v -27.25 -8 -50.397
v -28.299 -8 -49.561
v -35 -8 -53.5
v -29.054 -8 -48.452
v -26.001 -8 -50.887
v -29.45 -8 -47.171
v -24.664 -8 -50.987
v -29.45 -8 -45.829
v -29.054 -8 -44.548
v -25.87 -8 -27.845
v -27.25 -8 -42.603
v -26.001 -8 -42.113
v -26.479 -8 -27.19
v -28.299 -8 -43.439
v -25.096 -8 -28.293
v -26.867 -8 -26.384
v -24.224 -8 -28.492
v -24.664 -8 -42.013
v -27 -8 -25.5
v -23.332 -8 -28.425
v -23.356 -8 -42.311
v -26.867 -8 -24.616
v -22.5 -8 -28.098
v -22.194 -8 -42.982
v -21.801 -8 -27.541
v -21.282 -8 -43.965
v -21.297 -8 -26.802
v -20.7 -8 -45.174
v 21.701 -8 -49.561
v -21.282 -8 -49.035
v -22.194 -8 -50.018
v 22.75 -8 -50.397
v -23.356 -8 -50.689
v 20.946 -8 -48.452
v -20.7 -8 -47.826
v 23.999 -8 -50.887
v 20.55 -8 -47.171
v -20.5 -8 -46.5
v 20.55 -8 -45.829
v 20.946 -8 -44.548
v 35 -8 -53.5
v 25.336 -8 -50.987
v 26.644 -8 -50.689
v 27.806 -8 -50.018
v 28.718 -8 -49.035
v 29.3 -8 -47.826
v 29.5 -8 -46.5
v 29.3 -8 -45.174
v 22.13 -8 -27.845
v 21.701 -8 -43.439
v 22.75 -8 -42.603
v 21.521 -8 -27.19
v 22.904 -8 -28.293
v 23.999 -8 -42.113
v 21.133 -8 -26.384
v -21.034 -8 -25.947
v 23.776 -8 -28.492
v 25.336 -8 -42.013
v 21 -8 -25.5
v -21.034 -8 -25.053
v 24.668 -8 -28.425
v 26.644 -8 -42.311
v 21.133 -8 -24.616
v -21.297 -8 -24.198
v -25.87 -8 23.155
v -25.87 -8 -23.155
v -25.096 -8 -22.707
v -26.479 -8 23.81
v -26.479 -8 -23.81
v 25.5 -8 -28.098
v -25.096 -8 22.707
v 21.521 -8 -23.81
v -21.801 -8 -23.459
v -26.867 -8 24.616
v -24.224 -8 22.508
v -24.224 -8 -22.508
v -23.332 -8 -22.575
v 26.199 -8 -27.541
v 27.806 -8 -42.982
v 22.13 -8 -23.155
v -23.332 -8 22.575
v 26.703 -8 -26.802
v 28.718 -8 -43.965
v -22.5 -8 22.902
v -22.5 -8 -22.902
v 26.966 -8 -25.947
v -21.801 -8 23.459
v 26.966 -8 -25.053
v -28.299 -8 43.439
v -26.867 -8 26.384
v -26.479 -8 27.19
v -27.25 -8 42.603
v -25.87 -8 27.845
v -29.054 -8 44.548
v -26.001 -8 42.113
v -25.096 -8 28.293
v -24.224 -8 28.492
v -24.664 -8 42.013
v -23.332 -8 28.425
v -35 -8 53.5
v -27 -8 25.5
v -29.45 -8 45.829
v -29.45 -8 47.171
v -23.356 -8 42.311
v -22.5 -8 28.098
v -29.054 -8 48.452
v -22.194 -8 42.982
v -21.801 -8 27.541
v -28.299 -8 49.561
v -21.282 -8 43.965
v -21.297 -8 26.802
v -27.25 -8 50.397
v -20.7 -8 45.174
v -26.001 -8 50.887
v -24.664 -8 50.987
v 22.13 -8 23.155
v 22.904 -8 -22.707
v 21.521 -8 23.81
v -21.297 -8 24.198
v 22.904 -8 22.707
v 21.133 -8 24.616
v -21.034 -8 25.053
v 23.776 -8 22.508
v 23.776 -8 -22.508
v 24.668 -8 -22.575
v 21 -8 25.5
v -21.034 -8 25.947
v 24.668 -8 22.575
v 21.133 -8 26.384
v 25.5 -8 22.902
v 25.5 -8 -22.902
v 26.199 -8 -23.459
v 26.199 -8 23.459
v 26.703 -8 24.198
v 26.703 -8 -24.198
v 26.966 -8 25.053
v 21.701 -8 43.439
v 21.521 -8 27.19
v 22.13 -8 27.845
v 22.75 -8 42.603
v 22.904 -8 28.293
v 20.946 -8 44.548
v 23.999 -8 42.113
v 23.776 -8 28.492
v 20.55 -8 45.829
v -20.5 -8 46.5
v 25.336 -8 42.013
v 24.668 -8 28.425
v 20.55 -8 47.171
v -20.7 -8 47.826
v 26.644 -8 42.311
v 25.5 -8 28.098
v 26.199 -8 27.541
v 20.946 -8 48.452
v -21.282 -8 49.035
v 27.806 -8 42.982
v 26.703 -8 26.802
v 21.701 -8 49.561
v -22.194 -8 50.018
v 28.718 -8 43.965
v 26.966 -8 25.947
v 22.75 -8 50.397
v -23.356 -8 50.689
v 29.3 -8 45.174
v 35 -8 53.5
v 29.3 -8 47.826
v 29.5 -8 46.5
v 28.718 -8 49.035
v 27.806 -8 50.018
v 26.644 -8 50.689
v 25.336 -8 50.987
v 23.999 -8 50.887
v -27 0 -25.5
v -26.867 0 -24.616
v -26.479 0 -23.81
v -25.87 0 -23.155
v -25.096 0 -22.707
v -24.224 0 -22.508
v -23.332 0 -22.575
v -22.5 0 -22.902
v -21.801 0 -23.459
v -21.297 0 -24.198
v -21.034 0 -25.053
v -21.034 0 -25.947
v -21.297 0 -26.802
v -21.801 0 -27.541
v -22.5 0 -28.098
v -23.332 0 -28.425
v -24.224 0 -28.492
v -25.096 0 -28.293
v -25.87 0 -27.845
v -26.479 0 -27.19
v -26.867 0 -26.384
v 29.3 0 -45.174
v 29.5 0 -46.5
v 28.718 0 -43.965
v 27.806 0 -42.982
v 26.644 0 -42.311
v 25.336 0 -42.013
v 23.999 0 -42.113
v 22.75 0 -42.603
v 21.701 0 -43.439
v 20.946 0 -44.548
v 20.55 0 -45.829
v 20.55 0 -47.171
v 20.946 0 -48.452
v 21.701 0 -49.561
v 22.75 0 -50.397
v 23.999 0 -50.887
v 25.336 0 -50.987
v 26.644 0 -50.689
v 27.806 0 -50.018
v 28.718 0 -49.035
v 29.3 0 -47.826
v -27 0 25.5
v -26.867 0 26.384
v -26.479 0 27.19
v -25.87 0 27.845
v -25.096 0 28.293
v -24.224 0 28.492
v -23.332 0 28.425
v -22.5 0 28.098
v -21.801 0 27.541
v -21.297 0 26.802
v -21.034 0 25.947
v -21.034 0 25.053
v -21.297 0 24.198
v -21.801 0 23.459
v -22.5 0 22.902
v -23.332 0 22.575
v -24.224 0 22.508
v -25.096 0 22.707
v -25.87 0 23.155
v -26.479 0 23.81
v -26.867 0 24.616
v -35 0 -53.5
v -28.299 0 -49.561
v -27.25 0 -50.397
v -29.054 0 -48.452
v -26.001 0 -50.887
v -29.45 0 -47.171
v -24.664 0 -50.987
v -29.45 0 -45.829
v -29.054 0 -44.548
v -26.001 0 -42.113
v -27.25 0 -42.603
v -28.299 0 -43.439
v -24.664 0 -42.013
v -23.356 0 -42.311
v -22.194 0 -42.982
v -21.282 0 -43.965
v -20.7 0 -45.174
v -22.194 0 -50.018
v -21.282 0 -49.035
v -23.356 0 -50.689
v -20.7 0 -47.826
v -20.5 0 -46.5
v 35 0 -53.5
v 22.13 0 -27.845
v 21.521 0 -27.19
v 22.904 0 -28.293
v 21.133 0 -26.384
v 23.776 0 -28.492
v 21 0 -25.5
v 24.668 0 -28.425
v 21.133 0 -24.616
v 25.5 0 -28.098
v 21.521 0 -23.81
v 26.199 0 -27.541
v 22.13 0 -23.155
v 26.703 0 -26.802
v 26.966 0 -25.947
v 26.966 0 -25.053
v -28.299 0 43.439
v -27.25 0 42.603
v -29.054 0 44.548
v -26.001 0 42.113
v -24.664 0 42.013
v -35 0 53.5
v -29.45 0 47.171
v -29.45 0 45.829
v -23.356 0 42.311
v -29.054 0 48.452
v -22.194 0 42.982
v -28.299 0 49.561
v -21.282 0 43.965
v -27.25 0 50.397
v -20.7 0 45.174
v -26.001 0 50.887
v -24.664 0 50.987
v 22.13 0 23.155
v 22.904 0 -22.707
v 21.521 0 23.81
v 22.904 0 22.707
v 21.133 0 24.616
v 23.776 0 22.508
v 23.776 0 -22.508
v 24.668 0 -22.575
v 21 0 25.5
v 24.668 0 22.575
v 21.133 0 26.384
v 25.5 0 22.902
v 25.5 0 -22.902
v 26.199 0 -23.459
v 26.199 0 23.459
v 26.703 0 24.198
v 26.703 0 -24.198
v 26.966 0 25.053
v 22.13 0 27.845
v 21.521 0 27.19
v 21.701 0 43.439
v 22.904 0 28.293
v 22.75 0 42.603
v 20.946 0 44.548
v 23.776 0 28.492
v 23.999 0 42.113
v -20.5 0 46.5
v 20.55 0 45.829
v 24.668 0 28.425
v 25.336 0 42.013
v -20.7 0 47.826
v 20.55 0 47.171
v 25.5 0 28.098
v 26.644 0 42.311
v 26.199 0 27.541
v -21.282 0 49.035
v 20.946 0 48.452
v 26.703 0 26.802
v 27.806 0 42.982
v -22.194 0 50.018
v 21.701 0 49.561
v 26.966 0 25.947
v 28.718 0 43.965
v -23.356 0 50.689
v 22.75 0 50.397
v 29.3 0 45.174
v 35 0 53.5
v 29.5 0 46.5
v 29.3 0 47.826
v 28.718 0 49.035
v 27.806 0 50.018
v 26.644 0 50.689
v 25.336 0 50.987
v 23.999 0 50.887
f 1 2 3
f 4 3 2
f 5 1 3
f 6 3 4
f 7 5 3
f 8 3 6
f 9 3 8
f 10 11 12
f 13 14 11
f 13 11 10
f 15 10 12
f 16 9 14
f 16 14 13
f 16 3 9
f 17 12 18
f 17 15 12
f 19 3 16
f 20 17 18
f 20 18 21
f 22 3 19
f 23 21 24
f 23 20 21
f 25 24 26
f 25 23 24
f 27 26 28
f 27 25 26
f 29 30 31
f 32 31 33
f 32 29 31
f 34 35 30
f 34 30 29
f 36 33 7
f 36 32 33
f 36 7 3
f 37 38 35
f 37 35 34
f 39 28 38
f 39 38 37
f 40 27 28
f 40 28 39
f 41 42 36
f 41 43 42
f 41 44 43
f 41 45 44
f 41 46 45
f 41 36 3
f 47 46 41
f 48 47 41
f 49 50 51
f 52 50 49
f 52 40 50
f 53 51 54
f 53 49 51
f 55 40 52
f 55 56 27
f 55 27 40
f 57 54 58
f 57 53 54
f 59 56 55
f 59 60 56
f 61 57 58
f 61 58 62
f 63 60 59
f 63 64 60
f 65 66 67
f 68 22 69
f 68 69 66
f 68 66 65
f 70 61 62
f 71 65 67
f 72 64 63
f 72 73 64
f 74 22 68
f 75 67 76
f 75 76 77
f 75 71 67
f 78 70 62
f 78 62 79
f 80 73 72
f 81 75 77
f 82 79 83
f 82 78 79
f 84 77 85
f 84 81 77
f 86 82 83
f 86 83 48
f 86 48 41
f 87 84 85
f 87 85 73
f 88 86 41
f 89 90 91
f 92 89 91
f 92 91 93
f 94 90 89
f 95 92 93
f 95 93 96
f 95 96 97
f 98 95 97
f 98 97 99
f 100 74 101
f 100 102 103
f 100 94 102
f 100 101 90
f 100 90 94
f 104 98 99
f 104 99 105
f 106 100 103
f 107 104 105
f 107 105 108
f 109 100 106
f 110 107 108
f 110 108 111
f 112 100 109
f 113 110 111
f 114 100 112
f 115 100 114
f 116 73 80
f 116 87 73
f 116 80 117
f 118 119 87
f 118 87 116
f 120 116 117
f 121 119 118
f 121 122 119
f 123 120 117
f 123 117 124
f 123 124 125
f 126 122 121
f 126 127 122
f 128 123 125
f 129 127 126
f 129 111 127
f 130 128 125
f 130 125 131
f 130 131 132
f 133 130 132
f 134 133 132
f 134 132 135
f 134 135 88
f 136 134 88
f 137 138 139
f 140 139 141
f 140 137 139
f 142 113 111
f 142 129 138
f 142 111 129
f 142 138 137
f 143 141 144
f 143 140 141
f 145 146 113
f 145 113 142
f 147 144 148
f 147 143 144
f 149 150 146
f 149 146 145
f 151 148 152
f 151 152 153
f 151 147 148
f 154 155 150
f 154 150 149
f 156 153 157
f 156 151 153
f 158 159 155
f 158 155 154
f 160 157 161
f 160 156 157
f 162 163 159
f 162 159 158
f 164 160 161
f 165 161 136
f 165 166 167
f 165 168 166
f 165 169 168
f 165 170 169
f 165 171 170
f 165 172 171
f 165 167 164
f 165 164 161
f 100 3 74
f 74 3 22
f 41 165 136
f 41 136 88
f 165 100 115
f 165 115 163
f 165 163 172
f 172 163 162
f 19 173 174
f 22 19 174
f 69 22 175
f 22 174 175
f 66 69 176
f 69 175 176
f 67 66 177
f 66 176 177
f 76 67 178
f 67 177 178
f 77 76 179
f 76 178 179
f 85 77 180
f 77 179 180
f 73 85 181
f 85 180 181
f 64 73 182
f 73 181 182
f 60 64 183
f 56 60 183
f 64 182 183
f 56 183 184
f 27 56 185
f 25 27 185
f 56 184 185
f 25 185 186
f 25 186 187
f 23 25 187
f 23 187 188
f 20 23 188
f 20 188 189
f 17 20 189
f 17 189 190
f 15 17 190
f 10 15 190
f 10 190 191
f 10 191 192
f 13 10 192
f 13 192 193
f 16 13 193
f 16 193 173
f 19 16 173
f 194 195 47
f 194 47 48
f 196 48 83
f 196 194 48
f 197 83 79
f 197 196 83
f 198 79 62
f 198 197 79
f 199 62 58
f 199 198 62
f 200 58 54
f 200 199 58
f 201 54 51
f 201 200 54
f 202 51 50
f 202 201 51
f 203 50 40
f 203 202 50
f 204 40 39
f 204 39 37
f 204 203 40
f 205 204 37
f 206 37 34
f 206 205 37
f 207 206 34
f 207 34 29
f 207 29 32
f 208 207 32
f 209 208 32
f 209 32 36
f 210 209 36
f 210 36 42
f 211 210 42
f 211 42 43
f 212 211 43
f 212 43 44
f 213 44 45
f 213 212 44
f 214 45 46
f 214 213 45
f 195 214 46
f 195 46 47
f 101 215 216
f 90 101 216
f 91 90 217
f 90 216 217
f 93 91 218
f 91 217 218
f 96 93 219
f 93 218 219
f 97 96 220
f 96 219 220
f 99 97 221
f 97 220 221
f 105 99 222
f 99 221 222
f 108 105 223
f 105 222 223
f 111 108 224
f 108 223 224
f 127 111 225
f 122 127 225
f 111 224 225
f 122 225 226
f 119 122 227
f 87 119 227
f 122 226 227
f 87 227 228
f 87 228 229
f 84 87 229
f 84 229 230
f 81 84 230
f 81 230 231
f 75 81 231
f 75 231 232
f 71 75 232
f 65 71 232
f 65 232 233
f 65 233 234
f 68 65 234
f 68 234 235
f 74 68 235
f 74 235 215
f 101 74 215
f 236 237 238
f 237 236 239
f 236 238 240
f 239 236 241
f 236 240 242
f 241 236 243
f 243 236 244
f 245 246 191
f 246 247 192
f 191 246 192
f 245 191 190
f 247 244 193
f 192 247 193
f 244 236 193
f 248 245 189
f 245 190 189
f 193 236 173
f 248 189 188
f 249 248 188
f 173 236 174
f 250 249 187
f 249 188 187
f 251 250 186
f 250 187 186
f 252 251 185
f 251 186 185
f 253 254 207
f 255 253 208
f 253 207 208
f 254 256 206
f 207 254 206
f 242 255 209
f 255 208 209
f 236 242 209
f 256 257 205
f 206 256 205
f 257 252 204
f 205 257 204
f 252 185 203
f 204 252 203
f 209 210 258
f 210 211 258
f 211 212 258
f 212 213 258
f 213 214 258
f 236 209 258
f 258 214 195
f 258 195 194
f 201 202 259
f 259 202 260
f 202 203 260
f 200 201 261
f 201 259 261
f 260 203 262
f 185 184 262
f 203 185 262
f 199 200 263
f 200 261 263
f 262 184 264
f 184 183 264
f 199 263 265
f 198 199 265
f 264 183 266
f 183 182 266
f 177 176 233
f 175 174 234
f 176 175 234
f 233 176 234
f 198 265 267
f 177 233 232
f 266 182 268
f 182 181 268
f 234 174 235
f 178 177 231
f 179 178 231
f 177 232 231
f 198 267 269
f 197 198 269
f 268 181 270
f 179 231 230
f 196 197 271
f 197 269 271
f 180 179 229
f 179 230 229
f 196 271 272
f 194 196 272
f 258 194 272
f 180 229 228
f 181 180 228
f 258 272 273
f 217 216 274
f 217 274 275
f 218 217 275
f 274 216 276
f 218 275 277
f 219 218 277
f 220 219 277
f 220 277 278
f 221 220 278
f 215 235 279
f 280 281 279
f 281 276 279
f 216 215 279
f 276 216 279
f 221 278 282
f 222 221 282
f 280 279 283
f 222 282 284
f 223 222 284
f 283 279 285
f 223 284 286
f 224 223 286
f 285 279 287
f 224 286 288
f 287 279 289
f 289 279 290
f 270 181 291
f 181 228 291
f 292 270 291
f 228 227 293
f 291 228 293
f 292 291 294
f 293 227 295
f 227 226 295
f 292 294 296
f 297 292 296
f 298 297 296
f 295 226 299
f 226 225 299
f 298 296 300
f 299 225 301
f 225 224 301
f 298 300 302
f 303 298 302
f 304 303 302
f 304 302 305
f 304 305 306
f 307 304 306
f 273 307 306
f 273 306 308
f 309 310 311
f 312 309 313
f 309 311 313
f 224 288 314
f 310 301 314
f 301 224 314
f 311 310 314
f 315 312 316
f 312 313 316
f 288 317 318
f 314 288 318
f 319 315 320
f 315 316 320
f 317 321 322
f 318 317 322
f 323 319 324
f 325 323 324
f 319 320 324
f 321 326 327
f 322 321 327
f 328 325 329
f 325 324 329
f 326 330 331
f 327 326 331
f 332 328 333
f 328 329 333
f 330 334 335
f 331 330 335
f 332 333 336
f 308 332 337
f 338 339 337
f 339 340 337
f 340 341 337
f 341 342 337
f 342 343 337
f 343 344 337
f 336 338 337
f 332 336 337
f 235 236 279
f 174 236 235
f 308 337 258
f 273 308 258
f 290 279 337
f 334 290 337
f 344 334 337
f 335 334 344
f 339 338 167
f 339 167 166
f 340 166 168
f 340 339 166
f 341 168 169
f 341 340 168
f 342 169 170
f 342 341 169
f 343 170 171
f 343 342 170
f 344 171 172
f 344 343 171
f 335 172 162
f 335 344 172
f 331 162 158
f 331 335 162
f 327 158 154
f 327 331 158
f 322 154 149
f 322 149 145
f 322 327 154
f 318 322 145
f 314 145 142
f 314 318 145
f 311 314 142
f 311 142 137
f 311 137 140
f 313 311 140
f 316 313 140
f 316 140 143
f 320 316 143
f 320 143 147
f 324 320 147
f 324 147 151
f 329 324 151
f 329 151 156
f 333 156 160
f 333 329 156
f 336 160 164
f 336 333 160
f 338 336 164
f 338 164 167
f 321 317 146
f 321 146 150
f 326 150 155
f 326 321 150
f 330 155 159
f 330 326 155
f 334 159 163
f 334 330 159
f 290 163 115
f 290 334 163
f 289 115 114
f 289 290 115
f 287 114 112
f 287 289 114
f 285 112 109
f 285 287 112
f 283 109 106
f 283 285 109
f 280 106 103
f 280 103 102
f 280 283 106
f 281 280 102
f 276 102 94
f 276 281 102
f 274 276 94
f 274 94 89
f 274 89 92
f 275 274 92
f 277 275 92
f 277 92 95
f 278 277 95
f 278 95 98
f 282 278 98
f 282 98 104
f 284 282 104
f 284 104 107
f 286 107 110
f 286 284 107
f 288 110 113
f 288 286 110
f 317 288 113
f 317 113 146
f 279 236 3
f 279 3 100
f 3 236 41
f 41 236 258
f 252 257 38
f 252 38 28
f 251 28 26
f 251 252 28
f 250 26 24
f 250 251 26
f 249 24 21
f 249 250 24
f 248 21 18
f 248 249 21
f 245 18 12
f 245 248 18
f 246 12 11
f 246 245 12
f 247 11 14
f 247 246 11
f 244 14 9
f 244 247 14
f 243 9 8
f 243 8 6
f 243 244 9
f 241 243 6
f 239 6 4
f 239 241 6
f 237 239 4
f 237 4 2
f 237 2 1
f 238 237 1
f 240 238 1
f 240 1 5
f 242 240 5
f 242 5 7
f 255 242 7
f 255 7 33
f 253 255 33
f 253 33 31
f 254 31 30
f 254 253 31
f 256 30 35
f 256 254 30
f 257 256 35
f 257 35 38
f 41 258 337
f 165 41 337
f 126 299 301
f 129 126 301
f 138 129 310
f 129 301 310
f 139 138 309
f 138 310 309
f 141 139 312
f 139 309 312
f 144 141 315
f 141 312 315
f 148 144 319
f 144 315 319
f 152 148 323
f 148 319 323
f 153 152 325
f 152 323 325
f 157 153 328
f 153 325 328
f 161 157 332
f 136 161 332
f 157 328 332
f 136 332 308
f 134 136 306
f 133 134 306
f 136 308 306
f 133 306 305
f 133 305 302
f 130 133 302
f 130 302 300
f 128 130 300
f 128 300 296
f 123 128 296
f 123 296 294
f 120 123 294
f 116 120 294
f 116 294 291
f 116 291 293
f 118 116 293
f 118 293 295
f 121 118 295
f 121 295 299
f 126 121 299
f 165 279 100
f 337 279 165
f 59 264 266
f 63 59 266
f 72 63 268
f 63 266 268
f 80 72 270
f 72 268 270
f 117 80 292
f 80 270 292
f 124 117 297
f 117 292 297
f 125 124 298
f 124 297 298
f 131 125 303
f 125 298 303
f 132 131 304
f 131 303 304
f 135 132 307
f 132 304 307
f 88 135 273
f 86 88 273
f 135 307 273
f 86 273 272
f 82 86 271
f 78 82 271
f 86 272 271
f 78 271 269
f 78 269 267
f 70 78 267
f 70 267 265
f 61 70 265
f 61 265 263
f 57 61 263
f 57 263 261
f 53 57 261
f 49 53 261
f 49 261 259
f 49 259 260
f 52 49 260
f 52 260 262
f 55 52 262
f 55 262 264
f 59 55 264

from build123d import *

# Parameters (mm, degrees)
F0_W     = 70
F0_H     = 107
F0_R     = 4.5
F1_DEPTH = 8
F3_D     = 6
F3_DEPTH = 21


with BuildPart() as f1:
    # F0 (on Front) → F1 (new body)
    with BuildSketch(Plane.XZ):
        Rectangle(F0_W, F0_H)
        with Locations((-25, -46.5)):
            Circle(F0_R, mode=Mode.SUBTRACT)
        with Locations((25, -46.5)):
            Circle(F0_R, mode=Mode.SUBTRACT)
        with Locations((-25, 46.5)):
            Circle(F0_R, mode=Mode.SUBTRACT)
        with Locations((25, 46.5)):
            Circle(F0_R, mode=Mode.SUBTRACT)
    extrude(amount=F1_DEPTH)

    # F3
    with Locations(Plane.XZ.offset(8)):
        with Locations((-24, 25.5), (24, 25.5), (-24, -25.5), (24, -25.5)):
            Hole(F3_D / 2, depth=F3_DEPTH)


solid = f1.part
